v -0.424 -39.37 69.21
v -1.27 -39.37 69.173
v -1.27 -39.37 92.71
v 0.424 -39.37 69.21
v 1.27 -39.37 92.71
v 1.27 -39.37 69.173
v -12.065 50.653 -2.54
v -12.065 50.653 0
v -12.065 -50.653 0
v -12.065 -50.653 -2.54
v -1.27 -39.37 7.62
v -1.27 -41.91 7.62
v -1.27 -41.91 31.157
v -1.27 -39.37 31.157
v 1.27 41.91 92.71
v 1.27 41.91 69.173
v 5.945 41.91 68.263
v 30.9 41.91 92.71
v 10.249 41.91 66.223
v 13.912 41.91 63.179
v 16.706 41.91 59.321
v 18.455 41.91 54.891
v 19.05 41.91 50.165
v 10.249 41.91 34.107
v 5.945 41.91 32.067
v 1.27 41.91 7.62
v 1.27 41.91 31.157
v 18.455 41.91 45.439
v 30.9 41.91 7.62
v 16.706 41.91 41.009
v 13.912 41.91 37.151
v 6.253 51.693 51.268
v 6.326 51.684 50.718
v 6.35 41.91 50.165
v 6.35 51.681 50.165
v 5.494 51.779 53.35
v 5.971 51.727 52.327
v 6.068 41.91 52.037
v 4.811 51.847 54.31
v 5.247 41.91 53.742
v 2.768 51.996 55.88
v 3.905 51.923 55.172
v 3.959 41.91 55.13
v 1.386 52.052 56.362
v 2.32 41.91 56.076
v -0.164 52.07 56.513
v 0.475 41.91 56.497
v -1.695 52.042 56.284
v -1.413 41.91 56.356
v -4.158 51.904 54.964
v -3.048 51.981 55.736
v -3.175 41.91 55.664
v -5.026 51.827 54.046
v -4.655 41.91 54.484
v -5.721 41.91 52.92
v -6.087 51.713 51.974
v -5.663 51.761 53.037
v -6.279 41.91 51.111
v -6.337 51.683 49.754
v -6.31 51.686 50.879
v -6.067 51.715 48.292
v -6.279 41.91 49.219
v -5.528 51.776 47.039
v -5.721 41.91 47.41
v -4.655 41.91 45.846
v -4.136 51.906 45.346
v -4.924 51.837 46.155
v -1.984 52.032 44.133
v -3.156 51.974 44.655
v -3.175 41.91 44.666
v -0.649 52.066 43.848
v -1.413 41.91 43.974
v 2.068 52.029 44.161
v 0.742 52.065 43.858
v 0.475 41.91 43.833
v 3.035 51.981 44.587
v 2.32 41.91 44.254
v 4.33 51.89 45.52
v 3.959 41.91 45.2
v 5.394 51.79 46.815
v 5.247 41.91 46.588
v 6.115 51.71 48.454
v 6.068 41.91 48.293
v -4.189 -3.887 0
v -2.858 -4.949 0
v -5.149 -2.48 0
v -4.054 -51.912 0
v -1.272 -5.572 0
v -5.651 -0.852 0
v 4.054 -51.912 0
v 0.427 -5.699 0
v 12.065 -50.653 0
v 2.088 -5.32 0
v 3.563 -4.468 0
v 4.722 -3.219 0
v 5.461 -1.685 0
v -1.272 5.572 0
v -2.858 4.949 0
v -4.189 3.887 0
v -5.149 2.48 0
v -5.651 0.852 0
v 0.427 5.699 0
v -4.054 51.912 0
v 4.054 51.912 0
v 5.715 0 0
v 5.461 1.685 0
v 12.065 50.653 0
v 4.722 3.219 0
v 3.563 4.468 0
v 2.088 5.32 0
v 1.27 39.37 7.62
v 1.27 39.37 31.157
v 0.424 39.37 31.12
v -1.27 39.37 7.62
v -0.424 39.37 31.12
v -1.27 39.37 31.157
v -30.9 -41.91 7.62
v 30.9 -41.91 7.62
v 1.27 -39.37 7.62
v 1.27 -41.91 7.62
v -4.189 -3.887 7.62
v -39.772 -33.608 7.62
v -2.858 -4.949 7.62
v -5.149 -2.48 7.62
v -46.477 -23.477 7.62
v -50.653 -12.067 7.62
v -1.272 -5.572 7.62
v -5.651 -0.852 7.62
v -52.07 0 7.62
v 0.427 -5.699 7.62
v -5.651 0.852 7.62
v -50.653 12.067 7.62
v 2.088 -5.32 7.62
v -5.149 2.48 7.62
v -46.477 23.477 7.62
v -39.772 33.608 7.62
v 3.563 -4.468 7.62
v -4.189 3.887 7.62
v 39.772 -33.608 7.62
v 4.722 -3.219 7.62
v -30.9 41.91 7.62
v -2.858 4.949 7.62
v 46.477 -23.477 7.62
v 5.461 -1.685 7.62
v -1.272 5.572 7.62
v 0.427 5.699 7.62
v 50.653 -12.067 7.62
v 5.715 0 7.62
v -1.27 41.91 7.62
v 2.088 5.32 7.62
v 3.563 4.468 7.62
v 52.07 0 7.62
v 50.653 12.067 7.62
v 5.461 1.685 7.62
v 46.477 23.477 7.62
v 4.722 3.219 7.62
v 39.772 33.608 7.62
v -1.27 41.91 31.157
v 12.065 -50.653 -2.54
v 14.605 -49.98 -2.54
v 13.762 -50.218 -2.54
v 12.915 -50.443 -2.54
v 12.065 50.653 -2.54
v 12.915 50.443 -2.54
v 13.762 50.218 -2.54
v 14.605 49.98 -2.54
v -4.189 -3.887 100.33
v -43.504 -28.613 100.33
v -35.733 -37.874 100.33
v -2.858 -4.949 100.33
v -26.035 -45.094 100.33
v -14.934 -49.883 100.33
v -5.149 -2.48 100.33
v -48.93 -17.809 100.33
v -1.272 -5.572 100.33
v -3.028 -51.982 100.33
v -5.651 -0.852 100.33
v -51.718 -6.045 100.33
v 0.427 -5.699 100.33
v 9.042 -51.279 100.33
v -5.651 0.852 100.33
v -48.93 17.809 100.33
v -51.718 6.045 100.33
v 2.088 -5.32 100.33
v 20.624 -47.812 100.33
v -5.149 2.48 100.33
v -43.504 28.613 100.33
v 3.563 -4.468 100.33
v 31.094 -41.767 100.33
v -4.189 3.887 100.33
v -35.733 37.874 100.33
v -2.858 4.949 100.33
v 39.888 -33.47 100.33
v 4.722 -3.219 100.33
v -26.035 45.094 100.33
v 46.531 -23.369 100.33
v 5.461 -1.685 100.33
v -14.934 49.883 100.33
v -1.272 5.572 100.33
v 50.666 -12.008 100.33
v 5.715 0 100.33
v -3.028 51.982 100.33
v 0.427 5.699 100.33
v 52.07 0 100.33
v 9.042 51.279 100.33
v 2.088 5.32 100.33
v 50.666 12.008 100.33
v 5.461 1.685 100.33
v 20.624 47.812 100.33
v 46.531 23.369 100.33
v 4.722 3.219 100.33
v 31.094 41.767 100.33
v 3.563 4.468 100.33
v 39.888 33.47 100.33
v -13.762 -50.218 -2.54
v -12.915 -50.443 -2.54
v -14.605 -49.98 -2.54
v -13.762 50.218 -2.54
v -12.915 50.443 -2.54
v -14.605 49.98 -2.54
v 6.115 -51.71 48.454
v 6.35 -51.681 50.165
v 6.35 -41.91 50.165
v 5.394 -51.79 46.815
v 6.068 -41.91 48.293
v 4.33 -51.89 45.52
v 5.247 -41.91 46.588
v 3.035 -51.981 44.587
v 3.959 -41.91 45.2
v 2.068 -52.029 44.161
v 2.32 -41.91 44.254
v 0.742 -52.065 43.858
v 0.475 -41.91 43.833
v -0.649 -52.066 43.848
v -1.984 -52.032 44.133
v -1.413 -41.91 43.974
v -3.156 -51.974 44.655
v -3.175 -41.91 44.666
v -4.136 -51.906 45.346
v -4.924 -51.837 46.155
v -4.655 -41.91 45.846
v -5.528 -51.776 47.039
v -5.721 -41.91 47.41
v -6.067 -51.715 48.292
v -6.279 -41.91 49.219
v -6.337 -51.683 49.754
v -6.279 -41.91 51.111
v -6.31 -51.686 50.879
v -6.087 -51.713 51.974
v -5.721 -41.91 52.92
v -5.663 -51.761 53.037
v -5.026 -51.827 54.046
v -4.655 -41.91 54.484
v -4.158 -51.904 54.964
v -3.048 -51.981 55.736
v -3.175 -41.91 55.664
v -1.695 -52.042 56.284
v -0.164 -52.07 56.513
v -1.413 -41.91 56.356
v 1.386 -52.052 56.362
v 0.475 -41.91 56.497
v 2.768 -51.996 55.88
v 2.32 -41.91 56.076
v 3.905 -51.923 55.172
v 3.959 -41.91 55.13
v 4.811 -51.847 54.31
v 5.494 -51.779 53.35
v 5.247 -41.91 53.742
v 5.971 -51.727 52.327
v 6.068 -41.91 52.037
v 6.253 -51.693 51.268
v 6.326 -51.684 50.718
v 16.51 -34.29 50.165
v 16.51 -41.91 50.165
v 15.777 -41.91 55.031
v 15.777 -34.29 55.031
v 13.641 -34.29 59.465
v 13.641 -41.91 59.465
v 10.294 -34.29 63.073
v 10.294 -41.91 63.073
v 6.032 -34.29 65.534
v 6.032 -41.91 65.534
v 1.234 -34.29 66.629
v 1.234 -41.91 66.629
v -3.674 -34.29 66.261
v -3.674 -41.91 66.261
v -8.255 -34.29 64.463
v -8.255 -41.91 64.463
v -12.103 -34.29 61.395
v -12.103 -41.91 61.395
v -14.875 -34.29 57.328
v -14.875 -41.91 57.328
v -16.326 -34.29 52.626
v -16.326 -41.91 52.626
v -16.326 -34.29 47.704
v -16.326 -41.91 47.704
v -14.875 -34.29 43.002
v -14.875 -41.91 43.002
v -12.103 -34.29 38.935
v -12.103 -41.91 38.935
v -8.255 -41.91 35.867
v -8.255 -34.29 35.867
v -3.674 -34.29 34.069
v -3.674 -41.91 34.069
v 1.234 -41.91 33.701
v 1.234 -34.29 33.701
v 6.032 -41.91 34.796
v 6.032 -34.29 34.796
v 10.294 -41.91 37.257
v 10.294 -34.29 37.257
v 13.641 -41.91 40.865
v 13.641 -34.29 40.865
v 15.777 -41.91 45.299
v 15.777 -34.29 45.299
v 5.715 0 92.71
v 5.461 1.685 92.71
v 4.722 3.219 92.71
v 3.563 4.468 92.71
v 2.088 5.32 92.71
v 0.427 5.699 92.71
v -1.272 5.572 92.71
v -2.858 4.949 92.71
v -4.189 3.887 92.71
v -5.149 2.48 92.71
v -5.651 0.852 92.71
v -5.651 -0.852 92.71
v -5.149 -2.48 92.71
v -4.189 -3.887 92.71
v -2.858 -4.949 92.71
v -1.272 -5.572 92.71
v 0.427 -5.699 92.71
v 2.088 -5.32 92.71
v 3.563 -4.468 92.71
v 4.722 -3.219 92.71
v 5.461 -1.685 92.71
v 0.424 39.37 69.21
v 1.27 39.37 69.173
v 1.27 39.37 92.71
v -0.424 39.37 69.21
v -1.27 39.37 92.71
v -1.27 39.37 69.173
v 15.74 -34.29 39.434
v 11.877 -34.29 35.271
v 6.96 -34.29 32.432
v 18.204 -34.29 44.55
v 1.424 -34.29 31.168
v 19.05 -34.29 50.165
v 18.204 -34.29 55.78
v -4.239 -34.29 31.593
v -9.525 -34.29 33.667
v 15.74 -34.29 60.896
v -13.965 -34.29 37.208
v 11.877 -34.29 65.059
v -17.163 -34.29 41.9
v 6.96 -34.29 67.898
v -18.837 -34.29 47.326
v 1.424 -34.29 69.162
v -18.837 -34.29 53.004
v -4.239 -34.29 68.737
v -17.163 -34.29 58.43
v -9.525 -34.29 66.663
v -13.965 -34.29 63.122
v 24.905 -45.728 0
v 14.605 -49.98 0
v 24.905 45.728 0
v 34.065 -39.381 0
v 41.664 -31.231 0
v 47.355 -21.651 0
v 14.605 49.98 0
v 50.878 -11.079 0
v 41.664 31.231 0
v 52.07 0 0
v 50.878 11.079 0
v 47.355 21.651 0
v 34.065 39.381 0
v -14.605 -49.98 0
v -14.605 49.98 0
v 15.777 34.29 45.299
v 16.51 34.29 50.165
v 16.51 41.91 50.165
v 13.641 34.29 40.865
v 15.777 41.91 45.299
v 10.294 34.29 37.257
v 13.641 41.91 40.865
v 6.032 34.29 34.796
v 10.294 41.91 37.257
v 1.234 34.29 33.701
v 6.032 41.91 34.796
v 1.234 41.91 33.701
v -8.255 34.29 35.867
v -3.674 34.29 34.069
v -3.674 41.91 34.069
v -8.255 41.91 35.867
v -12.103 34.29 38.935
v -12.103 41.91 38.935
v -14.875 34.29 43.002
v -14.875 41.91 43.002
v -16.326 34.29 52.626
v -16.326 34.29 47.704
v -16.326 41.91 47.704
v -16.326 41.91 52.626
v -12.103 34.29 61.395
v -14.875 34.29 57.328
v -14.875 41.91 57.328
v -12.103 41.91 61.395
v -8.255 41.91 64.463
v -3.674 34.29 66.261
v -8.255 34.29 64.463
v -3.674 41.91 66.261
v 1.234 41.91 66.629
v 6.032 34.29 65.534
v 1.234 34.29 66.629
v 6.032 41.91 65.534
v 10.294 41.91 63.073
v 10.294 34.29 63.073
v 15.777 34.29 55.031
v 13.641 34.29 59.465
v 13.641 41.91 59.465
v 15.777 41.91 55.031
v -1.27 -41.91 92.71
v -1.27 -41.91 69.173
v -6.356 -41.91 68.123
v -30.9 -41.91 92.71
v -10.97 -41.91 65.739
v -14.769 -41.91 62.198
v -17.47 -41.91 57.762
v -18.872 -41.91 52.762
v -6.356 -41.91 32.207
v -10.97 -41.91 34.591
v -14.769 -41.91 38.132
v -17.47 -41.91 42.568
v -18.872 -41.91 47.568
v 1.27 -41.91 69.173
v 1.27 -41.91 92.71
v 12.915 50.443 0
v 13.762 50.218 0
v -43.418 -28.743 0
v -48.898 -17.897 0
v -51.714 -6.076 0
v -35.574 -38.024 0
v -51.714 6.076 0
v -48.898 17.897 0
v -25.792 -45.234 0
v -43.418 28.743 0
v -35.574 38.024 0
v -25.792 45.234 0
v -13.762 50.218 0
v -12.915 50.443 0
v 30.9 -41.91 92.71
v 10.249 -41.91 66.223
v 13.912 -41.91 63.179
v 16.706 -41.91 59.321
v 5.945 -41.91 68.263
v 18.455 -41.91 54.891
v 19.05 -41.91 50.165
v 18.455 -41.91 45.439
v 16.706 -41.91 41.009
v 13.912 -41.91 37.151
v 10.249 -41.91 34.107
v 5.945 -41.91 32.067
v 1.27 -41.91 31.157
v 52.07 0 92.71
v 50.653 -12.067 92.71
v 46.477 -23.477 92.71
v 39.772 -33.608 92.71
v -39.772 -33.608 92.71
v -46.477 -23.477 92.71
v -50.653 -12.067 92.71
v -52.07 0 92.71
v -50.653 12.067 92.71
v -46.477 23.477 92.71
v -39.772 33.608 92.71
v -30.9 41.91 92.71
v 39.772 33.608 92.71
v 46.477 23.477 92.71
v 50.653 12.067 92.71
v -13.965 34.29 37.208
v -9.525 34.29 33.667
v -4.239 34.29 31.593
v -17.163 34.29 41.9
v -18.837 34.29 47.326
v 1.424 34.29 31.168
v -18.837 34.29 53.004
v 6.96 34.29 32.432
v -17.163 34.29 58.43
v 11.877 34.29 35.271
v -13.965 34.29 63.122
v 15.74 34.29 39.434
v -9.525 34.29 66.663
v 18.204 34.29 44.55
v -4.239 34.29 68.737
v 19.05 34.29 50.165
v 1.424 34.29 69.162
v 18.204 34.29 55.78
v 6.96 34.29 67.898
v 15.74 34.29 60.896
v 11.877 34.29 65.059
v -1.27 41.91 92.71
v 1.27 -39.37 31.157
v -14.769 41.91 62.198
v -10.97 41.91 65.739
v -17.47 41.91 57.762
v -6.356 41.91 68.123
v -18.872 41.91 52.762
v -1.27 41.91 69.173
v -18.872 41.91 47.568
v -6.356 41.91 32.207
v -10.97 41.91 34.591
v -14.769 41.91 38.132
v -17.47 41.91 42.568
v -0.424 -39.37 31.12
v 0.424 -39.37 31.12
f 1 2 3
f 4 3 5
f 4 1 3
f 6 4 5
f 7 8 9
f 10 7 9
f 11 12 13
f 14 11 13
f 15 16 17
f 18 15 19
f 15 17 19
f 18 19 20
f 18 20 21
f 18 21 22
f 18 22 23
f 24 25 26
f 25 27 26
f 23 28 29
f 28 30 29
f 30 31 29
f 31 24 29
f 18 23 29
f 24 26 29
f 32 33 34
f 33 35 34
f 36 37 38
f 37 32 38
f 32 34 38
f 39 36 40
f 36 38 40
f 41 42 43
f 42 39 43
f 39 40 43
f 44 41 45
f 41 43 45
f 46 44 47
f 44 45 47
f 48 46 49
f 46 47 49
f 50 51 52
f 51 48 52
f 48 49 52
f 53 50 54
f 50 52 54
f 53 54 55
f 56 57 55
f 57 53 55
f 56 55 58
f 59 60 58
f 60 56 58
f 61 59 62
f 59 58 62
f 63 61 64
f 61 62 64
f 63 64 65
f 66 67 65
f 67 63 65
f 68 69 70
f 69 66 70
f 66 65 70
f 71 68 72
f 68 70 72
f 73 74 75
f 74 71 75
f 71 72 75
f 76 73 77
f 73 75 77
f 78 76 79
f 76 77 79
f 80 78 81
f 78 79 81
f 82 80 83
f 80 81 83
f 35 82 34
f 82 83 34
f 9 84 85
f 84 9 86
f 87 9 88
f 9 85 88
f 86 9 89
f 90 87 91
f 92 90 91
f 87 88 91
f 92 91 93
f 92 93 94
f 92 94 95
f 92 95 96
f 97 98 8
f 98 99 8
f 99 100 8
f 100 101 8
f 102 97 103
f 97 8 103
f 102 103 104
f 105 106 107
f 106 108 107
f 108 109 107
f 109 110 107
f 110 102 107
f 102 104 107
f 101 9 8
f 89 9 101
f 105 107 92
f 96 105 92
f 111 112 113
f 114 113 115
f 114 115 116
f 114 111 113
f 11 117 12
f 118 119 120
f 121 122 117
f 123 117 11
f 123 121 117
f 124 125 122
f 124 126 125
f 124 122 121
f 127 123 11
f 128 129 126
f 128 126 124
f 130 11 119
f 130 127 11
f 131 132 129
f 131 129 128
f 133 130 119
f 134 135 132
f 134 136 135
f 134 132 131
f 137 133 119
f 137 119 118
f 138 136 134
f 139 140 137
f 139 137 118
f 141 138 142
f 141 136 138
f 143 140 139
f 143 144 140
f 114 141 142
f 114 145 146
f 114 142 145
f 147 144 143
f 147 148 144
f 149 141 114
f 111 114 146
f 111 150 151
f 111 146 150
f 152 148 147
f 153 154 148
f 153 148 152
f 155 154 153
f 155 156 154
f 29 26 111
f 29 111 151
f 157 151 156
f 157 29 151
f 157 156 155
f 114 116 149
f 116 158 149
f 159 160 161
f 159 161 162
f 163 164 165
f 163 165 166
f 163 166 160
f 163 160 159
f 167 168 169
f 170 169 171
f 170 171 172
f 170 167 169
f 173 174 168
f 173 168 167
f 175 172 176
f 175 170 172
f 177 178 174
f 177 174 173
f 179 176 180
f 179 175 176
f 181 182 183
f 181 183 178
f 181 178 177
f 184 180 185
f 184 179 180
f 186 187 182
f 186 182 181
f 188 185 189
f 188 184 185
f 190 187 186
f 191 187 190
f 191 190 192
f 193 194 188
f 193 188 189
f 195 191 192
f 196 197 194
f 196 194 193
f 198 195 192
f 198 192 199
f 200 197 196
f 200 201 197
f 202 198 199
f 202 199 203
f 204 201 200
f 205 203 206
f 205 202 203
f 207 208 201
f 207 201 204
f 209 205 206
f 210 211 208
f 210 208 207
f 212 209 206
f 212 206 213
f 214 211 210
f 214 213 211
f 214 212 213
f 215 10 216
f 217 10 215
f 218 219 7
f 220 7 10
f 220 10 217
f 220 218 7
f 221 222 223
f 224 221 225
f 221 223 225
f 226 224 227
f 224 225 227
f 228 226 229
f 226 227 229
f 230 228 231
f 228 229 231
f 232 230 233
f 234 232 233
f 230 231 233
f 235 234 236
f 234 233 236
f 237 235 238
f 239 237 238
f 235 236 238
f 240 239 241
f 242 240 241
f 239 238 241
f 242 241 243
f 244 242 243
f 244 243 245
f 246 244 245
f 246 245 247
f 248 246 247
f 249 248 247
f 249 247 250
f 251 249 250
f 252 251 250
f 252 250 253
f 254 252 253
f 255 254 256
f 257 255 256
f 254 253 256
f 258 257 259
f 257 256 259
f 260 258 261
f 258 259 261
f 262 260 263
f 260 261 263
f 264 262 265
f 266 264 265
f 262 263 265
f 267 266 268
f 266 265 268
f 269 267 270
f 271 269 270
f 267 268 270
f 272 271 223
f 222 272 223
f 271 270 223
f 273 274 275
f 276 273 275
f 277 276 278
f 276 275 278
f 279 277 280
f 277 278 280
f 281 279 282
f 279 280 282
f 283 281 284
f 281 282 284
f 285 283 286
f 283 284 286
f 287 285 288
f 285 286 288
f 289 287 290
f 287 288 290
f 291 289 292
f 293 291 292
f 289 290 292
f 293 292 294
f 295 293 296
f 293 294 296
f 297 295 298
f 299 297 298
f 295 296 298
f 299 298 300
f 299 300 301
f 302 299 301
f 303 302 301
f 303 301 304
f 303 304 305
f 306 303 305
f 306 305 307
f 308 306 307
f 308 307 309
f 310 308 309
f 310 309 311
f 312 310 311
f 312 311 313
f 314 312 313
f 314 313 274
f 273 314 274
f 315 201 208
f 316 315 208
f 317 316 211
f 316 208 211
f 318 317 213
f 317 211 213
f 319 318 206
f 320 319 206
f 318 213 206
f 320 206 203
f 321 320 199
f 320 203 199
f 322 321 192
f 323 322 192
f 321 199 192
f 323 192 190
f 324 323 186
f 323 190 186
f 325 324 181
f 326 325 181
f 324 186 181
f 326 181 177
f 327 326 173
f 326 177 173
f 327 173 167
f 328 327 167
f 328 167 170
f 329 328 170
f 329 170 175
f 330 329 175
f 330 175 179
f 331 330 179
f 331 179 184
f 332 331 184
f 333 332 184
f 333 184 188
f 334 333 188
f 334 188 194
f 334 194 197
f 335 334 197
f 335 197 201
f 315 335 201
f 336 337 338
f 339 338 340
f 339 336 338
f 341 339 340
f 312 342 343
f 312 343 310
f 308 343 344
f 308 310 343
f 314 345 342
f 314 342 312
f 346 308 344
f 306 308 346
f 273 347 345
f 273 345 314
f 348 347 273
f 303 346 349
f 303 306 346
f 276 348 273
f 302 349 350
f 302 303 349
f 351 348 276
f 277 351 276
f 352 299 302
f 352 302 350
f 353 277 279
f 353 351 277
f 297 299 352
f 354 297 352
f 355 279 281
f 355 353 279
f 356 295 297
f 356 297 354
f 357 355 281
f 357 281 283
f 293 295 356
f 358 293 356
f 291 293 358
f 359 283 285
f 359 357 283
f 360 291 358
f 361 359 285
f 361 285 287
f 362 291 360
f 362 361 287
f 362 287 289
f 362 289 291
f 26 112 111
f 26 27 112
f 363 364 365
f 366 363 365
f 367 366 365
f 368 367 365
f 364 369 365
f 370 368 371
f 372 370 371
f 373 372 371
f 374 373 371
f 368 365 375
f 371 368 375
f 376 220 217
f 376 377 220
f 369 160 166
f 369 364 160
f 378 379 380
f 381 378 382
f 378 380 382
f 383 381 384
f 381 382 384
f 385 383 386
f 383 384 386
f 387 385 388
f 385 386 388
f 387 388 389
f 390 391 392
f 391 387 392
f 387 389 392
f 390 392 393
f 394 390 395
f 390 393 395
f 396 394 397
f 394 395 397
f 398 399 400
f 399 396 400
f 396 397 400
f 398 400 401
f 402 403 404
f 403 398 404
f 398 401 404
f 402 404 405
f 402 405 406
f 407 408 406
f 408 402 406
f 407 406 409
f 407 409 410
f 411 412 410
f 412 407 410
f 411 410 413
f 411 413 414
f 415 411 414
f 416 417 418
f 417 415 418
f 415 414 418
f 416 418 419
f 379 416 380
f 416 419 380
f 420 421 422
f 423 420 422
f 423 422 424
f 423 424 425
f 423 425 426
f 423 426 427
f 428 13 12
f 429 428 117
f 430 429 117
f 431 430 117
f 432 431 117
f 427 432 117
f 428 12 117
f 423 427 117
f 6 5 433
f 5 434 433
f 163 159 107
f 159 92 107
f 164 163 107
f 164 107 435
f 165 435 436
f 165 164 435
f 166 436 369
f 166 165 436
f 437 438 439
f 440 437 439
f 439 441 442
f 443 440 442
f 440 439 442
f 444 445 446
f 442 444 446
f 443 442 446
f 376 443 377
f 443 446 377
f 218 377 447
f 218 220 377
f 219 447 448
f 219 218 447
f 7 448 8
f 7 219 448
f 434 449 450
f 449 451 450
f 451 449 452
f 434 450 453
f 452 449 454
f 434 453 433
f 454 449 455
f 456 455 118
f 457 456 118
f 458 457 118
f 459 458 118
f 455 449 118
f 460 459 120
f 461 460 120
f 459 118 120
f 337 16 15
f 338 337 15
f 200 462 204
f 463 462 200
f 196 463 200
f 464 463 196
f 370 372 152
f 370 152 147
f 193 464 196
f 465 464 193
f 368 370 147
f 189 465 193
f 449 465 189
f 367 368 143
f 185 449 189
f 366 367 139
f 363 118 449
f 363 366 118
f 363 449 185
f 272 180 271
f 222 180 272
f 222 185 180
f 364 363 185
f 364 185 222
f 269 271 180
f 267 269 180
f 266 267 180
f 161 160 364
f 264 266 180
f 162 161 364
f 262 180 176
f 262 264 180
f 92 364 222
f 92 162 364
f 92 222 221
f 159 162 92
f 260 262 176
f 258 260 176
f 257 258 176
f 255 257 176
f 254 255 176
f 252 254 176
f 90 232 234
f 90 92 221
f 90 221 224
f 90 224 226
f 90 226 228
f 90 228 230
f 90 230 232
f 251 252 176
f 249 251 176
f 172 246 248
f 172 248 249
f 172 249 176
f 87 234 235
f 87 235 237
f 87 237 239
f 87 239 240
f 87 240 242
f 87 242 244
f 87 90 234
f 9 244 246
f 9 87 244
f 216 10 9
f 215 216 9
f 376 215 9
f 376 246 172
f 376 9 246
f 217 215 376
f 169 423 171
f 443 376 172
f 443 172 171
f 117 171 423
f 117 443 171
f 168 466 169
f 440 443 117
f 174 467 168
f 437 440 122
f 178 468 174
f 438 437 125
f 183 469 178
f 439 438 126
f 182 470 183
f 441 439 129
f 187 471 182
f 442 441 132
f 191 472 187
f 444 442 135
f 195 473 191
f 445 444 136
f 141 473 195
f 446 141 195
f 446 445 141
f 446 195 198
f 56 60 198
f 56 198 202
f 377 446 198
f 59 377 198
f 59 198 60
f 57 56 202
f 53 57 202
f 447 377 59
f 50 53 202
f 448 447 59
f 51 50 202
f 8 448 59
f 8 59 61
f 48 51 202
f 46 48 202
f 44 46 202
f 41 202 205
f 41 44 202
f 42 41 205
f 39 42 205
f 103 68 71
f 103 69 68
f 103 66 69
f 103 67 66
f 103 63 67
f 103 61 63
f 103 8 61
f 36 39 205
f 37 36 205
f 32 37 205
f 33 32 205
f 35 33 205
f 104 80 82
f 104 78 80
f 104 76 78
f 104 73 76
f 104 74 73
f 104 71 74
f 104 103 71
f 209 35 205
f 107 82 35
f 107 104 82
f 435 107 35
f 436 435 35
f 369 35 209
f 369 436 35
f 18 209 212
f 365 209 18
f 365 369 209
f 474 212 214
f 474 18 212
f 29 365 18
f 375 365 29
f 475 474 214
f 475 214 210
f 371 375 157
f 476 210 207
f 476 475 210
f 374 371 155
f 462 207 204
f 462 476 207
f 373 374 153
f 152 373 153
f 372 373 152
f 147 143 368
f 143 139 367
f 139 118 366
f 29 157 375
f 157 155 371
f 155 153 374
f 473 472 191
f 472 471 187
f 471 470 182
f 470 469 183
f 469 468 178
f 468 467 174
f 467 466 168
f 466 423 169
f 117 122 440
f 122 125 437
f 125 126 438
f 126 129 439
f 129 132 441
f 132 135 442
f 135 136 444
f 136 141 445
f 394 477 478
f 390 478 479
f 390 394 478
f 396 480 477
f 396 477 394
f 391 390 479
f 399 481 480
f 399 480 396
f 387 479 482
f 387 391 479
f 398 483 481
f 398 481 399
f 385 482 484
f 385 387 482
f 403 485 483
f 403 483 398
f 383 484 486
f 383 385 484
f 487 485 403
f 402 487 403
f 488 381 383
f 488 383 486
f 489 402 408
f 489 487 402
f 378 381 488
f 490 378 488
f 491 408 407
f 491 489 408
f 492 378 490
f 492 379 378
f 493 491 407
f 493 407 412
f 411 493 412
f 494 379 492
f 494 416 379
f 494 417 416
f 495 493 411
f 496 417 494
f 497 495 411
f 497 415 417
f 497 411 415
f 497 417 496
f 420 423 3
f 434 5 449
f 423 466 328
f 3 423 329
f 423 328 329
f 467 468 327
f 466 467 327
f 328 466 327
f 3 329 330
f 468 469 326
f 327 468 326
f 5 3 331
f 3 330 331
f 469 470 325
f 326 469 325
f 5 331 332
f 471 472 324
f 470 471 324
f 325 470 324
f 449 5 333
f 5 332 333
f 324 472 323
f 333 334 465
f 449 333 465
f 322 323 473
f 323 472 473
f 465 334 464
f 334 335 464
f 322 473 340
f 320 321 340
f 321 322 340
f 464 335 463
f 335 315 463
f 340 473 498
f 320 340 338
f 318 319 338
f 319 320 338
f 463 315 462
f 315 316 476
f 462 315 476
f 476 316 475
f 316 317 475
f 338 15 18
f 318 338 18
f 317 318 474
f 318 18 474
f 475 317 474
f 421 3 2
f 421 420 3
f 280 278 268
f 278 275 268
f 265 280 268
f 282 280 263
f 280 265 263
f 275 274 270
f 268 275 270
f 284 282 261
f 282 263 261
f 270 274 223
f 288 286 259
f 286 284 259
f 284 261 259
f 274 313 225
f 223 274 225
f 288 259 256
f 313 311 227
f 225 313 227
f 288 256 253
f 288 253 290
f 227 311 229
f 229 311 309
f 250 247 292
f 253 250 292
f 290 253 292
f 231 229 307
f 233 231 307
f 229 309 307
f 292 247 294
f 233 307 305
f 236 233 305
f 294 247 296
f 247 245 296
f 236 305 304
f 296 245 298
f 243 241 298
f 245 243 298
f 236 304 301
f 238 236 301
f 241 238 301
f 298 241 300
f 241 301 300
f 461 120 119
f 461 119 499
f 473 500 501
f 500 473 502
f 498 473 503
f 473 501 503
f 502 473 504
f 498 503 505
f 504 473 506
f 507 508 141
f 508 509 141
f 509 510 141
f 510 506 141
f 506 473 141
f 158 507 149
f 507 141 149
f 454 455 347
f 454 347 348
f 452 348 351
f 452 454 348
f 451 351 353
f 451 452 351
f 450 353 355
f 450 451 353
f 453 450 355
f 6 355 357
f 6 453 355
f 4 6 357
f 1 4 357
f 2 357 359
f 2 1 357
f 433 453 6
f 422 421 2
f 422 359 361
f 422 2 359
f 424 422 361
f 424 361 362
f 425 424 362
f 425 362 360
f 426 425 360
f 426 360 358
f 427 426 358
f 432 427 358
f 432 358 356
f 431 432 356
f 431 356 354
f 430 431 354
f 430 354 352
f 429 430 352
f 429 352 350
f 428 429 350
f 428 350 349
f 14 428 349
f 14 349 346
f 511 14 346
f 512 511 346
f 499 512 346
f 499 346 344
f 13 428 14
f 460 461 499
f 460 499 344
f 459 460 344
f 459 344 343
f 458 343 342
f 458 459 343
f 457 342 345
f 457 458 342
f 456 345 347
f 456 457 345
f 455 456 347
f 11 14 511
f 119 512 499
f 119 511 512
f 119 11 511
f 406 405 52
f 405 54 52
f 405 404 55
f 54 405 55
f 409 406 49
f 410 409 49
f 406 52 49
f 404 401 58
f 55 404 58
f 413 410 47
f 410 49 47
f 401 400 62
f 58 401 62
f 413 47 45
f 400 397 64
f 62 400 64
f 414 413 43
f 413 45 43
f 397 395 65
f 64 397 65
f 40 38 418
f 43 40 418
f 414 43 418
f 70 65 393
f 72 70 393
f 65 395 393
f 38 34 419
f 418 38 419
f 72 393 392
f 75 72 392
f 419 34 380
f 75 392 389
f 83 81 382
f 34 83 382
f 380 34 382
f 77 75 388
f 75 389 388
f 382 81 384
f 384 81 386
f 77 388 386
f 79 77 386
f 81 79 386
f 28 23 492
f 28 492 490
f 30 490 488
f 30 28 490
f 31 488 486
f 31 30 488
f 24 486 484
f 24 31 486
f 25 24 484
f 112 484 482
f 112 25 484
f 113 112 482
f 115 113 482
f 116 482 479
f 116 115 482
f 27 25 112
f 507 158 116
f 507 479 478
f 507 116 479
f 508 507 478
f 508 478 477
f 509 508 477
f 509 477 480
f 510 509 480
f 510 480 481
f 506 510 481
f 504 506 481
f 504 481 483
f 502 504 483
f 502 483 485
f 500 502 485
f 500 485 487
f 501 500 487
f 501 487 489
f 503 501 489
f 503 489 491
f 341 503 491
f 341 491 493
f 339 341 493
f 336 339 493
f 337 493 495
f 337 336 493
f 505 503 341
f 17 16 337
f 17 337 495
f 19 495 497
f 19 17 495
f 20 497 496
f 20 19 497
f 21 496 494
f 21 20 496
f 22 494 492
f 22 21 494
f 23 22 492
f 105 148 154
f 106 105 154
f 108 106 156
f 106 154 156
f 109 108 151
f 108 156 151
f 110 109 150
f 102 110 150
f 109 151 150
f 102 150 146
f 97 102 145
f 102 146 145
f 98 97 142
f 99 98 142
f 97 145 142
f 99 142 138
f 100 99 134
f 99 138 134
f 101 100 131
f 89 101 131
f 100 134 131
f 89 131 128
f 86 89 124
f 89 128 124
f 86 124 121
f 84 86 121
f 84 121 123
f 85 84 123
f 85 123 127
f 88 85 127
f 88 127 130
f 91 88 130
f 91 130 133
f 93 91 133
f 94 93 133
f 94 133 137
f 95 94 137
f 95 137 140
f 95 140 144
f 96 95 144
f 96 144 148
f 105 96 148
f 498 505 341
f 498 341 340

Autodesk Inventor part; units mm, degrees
ref_plane "YZ Plane" through (0, 0, 0) normal (1, 0, 0) x (0, 1, 0)
ref_plane "XZ Plane" through (0, 0, 0) normal (0, 1, 0) x (-1, 0, 0)
ref_plane "XY Plane" through (0, 0, 0) normal (0, 0, 1) x (1, 0, 0)
sketch "Sketch1" plane through (0, 0, 0) normal (0, 0, 1) x (1, 0, 0)
  circle A0 centre (0, 0) radius 52.07
  dimension "d0" = 104.14
extrude "Extrusion1" add sketch "Sketch1" along normal blind 7.62
ref_plane "Work Plane1" through (0, 0, 92.71) normal (0, 0, 1) x (1, 0, 0)
sketch "Sketch2" plane through (0, 0, 92.71) normal (0, 0, 1) x (1, 0, 0)
  circle A0 centre (0, 0) radius 52.07
  dimension "d4" = 104.14
extrude "Extrusion2" add sketch "Sketch2" along normal blind 7.62
sketch "Sketch3" plane through (0, 0, 7.62) normal (0, 0, 1) x (1, 0, 0)
  circle A0 centre (0, 0) radius 52.07 projected
  line L0 (0, 52.07) -> (0, 41.91)
  line L1 (0, 41.91) -> (30.9004, 41.91)
  line L2 (0, 41.91) -> (-30.9004, 41.91)
  line L3 (0, 0) -> (20.3569, 0)
  dimension "d7" = 10.16
ref_plane "Work Plane2" through (0, 0, 7.62) normal (0, -1, 0) x (1, 0, 0)
extrude "Extrusion3" add sketch "Sketch3" along normal blind 87.5665 contours L1 L0 A0 | A0 L0 L2
mirror "Mirror1" about plane through (0, 0, 7.62) normal (0, -1, 0) of "Extrusion3"
sketch "Sketch4" plane through (0, 0, 100.33) normal (0, 0, 1) x (1, 0, 0)
  circle A0 centre (0, 0) radius 5.715
  dimension "d11" = 11.43
extrude "Extrusion4" cut sketch "Sketch4" against normal blind 101.6
sketch "Sketch5" plane through (0, 0, 7.62) normal (0, 0, 1) x (1, 0, 0)
  circle A0 centre (0, 0) radius 13.335
  circle A1 centre (0, 0) radius 5.715
  circle A2 centre (0, 0) radius 15.875
  dimension "d14" = 26.67
  dimension "d15" = 31.75
extrude "Extrusion5" add sketch "Sketch5" along normal blind 7.62 contours A2
sketch "Sketch6" plane through (-30.9004, -41.91, 92.71) normal (0, 1, 0) x (1, 0, 0)
  line L0 (61.8009, 85.09) -> (61.8009, 0) projected
  line L1 (61.8009, 42.545) -> (33.4028, 42.545)
  line L2 (0, 85.09) -> (0, 0) projected
  line L3 (0, 42.545) -> (61.8009, 42.545)
  line L4 (36.6154, -7.62) -> (25.1854, -7.62) projected
  line L5 (30.9004, -7.62) -> (30.9004, 92.71)
  circle A0 centre (30.9004, 42.545) radius 6.35
  point P0 (61.8009, 0)
  point P1 (58.0758, -2.4765)
  dimension "d53" = 12.7
extrude "Extrusion6" cut sketch "Sketch6" along normal mid plane 223.8375
sketch "Sketch10" plane through (0, 0, 0) normal (0, 0, -1) x (-1, 0, 0)
  circle A0 centre (0, 0) radius 5.715 projected
  line L0 (5.715, 0) -> (12.065, 0)
  line L1 (12.065, 0) -> (12.065, 50.6529)
  circle A1 centre (0, 0) radius 52.07 projected
  line L2 (12.065, 0) -> (12.065, -50.6529)
  line L3 (12.065, 0) -> (14.605, 0)
  line L4 (14.605, 0) -> (14.605, 49.9798)
  line L5 (14.605, 0) -> (14.605, -49.9798)
  line L6 (-5.715, 0) -> (-12.065, 0)
  line L7 (-12.065, 0) -> (-12.065, 50.6529)
  line L8 (-12.065, 0) -> (-12.065, -50.6529)
  line L9 (-12.065, 0) -> (-14.605, 0)
  line L10 (-14.605, 0) -> (-14.605, 49.9798)
  line L11 (-14.605, 0) -> (-14.605, -49.9798)
  dimension "d32" = 6.35
  dimension "d33" = 2.54
  dimension "d34" = 6.35
  dimension "d35" = 2.54
extrude "Extrusion10" add sketch "Sketch10" along normal blind 2.54 contours L3 L5 A1 L2 | L1 A1 L4 L3 | L9 L10 A1 L7 | L8 A1 L11 L9
sketch "Sketch14" plane through (0, 0, 0) normal (1, 0, 0) x (0, 1, 0)
  point P0 (0, 0)
sketch "Sketch15" plane through (-30.9004, -41.91, 7.62) normal (0, 1, 0) x (1, 0, 0)
  line L0 (61.8009, -85.09) -> (0, -85.09)
  line L1 (0, -85.09) -> (61.8009, -85.09) projected
  point P0 (30.9004, 7.62)
  point P1 (29.6304, -85.09)
ref_plane "Work Plane3" through (2.5024, -41.91, 50.165) normal (0, 1, 0) x (1, 0, 0)
sketch "Sketch18" plane through (-30.9004, -41.91, 7.62) normal (0, 1, 0) x (1, 0, 0)
  line L0 (61.8009, 0) -> (61.8009, -85.09) projected
  line L1 (61.8009, -42.545) -> (0, -42.545)
  line L2 (0, 0) -> (0, -85.09) projected
  line L3 (36.6154, -92.71) -> (25.1854, -92.71) projected
  line L4 (30.9004, -92.71) -> (30.9004, 7.62)
sketch "Sketch19" plane through (0, 0, 0) normal (1, 0, 0) x (0, 1, 0)
  line L0 (41.91, 7.62) -> (-41.91, 7.62) projected
  line L1 (27.4323, 7.62) -> (27.4323, 20.239)
  line L2 (27.4323, 20.239) -> (-18.8978, 20.239)
  line L3 (-18.8978, 20.239) -> (-18.8978, 7.62)
  line L4 (27.4323, 7.62) -> (-18.8978, 7.62)
  point P0 (0, 0)
extrude "Extrusion16" cut sketch "Sketch19" along normal mid plane 101.6
sketch "Sketch20" plane through (-30.9004, 41.91, 7.62) normal (0, -1, 0) x (1, 0, 0)
  line L0 (0, 0) -> (0, 85.09) projected
  line L1 (0, 42.545) -> (61.8009, 42.545)
  line L2 (61.8009, 0) -> (61.8009, 85.09) projected
  circle A0 centre (30.9004, 42.545) radius 16.51
  circle A1 centre (30.9004, 42.545) radius 19.05
  point P0 (30.9004, -7.62)
  dimension "d61" = 33.02
  dimension "d62" = 38.1
extrude "Extrusion17" add sketch "Sketch20" along normal blind 7.62 contours A0 L1 A1 | L1 A1 A0
mirror "Mirror3" about plane through (0, 0, 7.62) normal (0, -1, 0) of "Extrusion17"
sketch "Sketch21" plane through (-30.9004, -41.91, 92.71) normal (0, 1, 0) x (1, 0, 0)
  line L0 (0, 85.09) -> (61.8009, 85.09) projected
  line L1 (30.9004, 85.09) -> (32.1704, 85.09)
  line L2 (32.1704, 85.09) -> (30.9004, 85.09)
  line L3 (30.9004, 85.09) -> (29.6304, 85.09)
  line L4 (29.6304, 85.09) -> (29.6304, 61.5526)
  circle A0 centre (30.9004, 42.545) radius 19.05 projected
  line L5 (32.1704, 85.09) -> (32.1704, 61.5526)
  line L6 (29.6304, 61.5526) -> (32.1704, 61.5526)
  line L7 (61.8009, 0) -> (0, 0) projected
  line L8 (30.9004, 0) -> (29.6304, 0)
  line L9 (29.6304, 0) -> (32.1704, 0)
  line L10 (32.1704, 0) -> (32.1704, 23.5374)
  line L11 (29.6304, 0) -> (29.6304, 23.5374)
  line L12 (32.1704, 23.5374) -> (29.6304, 23.5374)
  point P0 (30.9004, 92.71)
  dimension "d65" = 1.27
  dimension "d66" = 1.27
  dimension "d67" = 1.27
  dimension "d68" = 1.27
  dimension "d69" = 2.54
extrude "Extrusion18" add sketch "Sketch21" along normal blind 2.54 contours L0 L5 A0 L4 | A0 L10 L7 L11
mirror "Mirror4" about plane through (0, 0, 7.62) normal (0, -1, 0) of "Extrusion18"
properties part number "Fourth Diff"
